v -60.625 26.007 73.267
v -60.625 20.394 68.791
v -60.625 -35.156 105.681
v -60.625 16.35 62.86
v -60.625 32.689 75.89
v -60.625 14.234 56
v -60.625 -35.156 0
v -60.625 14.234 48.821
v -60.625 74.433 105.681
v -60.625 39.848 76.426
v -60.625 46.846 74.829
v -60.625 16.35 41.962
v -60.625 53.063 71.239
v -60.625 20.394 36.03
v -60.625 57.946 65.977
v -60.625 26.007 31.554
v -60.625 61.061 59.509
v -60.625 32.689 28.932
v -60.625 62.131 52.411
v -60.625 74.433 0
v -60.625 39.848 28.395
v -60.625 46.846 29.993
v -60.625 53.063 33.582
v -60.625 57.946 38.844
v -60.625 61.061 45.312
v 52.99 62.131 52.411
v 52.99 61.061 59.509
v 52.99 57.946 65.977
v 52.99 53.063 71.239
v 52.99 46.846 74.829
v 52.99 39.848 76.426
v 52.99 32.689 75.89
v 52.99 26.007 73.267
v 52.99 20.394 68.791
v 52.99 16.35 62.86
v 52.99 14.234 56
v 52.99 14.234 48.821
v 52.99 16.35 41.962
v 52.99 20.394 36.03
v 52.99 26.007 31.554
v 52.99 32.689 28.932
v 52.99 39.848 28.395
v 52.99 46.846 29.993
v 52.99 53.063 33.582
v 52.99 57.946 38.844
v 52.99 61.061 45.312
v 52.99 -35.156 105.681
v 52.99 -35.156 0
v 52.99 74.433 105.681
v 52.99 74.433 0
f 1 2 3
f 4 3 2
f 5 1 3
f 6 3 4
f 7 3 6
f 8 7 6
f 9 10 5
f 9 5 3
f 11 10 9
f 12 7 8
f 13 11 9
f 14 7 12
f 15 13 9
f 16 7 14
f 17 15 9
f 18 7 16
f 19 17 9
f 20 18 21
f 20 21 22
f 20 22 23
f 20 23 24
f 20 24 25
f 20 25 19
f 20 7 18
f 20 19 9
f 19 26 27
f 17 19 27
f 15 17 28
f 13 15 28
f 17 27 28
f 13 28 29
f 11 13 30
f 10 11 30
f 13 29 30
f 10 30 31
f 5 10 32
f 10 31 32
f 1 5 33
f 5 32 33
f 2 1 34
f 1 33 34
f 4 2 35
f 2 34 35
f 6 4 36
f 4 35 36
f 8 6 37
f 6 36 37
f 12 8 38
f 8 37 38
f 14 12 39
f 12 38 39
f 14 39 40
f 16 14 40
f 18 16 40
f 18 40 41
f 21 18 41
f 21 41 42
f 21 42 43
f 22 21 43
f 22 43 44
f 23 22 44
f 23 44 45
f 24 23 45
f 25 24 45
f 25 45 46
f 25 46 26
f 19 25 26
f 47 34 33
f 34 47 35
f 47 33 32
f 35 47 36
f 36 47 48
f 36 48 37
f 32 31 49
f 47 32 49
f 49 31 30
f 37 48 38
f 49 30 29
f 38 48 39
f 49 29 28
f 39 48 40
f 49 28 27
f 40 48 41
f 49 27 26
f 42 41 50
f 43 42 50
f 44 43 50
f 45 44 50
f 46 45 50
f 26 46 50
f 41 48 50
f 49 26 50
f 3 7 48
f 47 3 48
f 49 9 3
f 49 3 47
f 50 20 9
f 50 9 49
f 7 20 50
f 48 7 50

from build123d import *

# Parameters (mm, degrees)
F0_W     = 113.6151142418
F0_H     = 109.588842839
F1_DEPTH = 105.6814342737
F2_R     = 24.0827135545
F3_DEPTH = 200


# Not quite as in the source:
# - the program builds the solid bodies; features that only make, move or delete a surface that nothing else refers to are left out


with BuildPart() as f1:
    # F0 (on Top) → F1 (new body)
    with BuildSketch(Plane.XY):
        with Locations((-3.817750141, 19.6385178715)):
            Rectangle(F0_W, F0_H)
    extrude(amount=F1_DEPTH)

    # F2 (on face) → F3 (cut)
    with BuildSketch(Plane.YZ.offset(52.9898069799)):
        with Locations((38.0479171872, 52.4106435478)):
            Circle(F2_R)
    extrude(amount=-F3_DEPTH, mode=Mode.SUBTRACT)


solid = f1.part
